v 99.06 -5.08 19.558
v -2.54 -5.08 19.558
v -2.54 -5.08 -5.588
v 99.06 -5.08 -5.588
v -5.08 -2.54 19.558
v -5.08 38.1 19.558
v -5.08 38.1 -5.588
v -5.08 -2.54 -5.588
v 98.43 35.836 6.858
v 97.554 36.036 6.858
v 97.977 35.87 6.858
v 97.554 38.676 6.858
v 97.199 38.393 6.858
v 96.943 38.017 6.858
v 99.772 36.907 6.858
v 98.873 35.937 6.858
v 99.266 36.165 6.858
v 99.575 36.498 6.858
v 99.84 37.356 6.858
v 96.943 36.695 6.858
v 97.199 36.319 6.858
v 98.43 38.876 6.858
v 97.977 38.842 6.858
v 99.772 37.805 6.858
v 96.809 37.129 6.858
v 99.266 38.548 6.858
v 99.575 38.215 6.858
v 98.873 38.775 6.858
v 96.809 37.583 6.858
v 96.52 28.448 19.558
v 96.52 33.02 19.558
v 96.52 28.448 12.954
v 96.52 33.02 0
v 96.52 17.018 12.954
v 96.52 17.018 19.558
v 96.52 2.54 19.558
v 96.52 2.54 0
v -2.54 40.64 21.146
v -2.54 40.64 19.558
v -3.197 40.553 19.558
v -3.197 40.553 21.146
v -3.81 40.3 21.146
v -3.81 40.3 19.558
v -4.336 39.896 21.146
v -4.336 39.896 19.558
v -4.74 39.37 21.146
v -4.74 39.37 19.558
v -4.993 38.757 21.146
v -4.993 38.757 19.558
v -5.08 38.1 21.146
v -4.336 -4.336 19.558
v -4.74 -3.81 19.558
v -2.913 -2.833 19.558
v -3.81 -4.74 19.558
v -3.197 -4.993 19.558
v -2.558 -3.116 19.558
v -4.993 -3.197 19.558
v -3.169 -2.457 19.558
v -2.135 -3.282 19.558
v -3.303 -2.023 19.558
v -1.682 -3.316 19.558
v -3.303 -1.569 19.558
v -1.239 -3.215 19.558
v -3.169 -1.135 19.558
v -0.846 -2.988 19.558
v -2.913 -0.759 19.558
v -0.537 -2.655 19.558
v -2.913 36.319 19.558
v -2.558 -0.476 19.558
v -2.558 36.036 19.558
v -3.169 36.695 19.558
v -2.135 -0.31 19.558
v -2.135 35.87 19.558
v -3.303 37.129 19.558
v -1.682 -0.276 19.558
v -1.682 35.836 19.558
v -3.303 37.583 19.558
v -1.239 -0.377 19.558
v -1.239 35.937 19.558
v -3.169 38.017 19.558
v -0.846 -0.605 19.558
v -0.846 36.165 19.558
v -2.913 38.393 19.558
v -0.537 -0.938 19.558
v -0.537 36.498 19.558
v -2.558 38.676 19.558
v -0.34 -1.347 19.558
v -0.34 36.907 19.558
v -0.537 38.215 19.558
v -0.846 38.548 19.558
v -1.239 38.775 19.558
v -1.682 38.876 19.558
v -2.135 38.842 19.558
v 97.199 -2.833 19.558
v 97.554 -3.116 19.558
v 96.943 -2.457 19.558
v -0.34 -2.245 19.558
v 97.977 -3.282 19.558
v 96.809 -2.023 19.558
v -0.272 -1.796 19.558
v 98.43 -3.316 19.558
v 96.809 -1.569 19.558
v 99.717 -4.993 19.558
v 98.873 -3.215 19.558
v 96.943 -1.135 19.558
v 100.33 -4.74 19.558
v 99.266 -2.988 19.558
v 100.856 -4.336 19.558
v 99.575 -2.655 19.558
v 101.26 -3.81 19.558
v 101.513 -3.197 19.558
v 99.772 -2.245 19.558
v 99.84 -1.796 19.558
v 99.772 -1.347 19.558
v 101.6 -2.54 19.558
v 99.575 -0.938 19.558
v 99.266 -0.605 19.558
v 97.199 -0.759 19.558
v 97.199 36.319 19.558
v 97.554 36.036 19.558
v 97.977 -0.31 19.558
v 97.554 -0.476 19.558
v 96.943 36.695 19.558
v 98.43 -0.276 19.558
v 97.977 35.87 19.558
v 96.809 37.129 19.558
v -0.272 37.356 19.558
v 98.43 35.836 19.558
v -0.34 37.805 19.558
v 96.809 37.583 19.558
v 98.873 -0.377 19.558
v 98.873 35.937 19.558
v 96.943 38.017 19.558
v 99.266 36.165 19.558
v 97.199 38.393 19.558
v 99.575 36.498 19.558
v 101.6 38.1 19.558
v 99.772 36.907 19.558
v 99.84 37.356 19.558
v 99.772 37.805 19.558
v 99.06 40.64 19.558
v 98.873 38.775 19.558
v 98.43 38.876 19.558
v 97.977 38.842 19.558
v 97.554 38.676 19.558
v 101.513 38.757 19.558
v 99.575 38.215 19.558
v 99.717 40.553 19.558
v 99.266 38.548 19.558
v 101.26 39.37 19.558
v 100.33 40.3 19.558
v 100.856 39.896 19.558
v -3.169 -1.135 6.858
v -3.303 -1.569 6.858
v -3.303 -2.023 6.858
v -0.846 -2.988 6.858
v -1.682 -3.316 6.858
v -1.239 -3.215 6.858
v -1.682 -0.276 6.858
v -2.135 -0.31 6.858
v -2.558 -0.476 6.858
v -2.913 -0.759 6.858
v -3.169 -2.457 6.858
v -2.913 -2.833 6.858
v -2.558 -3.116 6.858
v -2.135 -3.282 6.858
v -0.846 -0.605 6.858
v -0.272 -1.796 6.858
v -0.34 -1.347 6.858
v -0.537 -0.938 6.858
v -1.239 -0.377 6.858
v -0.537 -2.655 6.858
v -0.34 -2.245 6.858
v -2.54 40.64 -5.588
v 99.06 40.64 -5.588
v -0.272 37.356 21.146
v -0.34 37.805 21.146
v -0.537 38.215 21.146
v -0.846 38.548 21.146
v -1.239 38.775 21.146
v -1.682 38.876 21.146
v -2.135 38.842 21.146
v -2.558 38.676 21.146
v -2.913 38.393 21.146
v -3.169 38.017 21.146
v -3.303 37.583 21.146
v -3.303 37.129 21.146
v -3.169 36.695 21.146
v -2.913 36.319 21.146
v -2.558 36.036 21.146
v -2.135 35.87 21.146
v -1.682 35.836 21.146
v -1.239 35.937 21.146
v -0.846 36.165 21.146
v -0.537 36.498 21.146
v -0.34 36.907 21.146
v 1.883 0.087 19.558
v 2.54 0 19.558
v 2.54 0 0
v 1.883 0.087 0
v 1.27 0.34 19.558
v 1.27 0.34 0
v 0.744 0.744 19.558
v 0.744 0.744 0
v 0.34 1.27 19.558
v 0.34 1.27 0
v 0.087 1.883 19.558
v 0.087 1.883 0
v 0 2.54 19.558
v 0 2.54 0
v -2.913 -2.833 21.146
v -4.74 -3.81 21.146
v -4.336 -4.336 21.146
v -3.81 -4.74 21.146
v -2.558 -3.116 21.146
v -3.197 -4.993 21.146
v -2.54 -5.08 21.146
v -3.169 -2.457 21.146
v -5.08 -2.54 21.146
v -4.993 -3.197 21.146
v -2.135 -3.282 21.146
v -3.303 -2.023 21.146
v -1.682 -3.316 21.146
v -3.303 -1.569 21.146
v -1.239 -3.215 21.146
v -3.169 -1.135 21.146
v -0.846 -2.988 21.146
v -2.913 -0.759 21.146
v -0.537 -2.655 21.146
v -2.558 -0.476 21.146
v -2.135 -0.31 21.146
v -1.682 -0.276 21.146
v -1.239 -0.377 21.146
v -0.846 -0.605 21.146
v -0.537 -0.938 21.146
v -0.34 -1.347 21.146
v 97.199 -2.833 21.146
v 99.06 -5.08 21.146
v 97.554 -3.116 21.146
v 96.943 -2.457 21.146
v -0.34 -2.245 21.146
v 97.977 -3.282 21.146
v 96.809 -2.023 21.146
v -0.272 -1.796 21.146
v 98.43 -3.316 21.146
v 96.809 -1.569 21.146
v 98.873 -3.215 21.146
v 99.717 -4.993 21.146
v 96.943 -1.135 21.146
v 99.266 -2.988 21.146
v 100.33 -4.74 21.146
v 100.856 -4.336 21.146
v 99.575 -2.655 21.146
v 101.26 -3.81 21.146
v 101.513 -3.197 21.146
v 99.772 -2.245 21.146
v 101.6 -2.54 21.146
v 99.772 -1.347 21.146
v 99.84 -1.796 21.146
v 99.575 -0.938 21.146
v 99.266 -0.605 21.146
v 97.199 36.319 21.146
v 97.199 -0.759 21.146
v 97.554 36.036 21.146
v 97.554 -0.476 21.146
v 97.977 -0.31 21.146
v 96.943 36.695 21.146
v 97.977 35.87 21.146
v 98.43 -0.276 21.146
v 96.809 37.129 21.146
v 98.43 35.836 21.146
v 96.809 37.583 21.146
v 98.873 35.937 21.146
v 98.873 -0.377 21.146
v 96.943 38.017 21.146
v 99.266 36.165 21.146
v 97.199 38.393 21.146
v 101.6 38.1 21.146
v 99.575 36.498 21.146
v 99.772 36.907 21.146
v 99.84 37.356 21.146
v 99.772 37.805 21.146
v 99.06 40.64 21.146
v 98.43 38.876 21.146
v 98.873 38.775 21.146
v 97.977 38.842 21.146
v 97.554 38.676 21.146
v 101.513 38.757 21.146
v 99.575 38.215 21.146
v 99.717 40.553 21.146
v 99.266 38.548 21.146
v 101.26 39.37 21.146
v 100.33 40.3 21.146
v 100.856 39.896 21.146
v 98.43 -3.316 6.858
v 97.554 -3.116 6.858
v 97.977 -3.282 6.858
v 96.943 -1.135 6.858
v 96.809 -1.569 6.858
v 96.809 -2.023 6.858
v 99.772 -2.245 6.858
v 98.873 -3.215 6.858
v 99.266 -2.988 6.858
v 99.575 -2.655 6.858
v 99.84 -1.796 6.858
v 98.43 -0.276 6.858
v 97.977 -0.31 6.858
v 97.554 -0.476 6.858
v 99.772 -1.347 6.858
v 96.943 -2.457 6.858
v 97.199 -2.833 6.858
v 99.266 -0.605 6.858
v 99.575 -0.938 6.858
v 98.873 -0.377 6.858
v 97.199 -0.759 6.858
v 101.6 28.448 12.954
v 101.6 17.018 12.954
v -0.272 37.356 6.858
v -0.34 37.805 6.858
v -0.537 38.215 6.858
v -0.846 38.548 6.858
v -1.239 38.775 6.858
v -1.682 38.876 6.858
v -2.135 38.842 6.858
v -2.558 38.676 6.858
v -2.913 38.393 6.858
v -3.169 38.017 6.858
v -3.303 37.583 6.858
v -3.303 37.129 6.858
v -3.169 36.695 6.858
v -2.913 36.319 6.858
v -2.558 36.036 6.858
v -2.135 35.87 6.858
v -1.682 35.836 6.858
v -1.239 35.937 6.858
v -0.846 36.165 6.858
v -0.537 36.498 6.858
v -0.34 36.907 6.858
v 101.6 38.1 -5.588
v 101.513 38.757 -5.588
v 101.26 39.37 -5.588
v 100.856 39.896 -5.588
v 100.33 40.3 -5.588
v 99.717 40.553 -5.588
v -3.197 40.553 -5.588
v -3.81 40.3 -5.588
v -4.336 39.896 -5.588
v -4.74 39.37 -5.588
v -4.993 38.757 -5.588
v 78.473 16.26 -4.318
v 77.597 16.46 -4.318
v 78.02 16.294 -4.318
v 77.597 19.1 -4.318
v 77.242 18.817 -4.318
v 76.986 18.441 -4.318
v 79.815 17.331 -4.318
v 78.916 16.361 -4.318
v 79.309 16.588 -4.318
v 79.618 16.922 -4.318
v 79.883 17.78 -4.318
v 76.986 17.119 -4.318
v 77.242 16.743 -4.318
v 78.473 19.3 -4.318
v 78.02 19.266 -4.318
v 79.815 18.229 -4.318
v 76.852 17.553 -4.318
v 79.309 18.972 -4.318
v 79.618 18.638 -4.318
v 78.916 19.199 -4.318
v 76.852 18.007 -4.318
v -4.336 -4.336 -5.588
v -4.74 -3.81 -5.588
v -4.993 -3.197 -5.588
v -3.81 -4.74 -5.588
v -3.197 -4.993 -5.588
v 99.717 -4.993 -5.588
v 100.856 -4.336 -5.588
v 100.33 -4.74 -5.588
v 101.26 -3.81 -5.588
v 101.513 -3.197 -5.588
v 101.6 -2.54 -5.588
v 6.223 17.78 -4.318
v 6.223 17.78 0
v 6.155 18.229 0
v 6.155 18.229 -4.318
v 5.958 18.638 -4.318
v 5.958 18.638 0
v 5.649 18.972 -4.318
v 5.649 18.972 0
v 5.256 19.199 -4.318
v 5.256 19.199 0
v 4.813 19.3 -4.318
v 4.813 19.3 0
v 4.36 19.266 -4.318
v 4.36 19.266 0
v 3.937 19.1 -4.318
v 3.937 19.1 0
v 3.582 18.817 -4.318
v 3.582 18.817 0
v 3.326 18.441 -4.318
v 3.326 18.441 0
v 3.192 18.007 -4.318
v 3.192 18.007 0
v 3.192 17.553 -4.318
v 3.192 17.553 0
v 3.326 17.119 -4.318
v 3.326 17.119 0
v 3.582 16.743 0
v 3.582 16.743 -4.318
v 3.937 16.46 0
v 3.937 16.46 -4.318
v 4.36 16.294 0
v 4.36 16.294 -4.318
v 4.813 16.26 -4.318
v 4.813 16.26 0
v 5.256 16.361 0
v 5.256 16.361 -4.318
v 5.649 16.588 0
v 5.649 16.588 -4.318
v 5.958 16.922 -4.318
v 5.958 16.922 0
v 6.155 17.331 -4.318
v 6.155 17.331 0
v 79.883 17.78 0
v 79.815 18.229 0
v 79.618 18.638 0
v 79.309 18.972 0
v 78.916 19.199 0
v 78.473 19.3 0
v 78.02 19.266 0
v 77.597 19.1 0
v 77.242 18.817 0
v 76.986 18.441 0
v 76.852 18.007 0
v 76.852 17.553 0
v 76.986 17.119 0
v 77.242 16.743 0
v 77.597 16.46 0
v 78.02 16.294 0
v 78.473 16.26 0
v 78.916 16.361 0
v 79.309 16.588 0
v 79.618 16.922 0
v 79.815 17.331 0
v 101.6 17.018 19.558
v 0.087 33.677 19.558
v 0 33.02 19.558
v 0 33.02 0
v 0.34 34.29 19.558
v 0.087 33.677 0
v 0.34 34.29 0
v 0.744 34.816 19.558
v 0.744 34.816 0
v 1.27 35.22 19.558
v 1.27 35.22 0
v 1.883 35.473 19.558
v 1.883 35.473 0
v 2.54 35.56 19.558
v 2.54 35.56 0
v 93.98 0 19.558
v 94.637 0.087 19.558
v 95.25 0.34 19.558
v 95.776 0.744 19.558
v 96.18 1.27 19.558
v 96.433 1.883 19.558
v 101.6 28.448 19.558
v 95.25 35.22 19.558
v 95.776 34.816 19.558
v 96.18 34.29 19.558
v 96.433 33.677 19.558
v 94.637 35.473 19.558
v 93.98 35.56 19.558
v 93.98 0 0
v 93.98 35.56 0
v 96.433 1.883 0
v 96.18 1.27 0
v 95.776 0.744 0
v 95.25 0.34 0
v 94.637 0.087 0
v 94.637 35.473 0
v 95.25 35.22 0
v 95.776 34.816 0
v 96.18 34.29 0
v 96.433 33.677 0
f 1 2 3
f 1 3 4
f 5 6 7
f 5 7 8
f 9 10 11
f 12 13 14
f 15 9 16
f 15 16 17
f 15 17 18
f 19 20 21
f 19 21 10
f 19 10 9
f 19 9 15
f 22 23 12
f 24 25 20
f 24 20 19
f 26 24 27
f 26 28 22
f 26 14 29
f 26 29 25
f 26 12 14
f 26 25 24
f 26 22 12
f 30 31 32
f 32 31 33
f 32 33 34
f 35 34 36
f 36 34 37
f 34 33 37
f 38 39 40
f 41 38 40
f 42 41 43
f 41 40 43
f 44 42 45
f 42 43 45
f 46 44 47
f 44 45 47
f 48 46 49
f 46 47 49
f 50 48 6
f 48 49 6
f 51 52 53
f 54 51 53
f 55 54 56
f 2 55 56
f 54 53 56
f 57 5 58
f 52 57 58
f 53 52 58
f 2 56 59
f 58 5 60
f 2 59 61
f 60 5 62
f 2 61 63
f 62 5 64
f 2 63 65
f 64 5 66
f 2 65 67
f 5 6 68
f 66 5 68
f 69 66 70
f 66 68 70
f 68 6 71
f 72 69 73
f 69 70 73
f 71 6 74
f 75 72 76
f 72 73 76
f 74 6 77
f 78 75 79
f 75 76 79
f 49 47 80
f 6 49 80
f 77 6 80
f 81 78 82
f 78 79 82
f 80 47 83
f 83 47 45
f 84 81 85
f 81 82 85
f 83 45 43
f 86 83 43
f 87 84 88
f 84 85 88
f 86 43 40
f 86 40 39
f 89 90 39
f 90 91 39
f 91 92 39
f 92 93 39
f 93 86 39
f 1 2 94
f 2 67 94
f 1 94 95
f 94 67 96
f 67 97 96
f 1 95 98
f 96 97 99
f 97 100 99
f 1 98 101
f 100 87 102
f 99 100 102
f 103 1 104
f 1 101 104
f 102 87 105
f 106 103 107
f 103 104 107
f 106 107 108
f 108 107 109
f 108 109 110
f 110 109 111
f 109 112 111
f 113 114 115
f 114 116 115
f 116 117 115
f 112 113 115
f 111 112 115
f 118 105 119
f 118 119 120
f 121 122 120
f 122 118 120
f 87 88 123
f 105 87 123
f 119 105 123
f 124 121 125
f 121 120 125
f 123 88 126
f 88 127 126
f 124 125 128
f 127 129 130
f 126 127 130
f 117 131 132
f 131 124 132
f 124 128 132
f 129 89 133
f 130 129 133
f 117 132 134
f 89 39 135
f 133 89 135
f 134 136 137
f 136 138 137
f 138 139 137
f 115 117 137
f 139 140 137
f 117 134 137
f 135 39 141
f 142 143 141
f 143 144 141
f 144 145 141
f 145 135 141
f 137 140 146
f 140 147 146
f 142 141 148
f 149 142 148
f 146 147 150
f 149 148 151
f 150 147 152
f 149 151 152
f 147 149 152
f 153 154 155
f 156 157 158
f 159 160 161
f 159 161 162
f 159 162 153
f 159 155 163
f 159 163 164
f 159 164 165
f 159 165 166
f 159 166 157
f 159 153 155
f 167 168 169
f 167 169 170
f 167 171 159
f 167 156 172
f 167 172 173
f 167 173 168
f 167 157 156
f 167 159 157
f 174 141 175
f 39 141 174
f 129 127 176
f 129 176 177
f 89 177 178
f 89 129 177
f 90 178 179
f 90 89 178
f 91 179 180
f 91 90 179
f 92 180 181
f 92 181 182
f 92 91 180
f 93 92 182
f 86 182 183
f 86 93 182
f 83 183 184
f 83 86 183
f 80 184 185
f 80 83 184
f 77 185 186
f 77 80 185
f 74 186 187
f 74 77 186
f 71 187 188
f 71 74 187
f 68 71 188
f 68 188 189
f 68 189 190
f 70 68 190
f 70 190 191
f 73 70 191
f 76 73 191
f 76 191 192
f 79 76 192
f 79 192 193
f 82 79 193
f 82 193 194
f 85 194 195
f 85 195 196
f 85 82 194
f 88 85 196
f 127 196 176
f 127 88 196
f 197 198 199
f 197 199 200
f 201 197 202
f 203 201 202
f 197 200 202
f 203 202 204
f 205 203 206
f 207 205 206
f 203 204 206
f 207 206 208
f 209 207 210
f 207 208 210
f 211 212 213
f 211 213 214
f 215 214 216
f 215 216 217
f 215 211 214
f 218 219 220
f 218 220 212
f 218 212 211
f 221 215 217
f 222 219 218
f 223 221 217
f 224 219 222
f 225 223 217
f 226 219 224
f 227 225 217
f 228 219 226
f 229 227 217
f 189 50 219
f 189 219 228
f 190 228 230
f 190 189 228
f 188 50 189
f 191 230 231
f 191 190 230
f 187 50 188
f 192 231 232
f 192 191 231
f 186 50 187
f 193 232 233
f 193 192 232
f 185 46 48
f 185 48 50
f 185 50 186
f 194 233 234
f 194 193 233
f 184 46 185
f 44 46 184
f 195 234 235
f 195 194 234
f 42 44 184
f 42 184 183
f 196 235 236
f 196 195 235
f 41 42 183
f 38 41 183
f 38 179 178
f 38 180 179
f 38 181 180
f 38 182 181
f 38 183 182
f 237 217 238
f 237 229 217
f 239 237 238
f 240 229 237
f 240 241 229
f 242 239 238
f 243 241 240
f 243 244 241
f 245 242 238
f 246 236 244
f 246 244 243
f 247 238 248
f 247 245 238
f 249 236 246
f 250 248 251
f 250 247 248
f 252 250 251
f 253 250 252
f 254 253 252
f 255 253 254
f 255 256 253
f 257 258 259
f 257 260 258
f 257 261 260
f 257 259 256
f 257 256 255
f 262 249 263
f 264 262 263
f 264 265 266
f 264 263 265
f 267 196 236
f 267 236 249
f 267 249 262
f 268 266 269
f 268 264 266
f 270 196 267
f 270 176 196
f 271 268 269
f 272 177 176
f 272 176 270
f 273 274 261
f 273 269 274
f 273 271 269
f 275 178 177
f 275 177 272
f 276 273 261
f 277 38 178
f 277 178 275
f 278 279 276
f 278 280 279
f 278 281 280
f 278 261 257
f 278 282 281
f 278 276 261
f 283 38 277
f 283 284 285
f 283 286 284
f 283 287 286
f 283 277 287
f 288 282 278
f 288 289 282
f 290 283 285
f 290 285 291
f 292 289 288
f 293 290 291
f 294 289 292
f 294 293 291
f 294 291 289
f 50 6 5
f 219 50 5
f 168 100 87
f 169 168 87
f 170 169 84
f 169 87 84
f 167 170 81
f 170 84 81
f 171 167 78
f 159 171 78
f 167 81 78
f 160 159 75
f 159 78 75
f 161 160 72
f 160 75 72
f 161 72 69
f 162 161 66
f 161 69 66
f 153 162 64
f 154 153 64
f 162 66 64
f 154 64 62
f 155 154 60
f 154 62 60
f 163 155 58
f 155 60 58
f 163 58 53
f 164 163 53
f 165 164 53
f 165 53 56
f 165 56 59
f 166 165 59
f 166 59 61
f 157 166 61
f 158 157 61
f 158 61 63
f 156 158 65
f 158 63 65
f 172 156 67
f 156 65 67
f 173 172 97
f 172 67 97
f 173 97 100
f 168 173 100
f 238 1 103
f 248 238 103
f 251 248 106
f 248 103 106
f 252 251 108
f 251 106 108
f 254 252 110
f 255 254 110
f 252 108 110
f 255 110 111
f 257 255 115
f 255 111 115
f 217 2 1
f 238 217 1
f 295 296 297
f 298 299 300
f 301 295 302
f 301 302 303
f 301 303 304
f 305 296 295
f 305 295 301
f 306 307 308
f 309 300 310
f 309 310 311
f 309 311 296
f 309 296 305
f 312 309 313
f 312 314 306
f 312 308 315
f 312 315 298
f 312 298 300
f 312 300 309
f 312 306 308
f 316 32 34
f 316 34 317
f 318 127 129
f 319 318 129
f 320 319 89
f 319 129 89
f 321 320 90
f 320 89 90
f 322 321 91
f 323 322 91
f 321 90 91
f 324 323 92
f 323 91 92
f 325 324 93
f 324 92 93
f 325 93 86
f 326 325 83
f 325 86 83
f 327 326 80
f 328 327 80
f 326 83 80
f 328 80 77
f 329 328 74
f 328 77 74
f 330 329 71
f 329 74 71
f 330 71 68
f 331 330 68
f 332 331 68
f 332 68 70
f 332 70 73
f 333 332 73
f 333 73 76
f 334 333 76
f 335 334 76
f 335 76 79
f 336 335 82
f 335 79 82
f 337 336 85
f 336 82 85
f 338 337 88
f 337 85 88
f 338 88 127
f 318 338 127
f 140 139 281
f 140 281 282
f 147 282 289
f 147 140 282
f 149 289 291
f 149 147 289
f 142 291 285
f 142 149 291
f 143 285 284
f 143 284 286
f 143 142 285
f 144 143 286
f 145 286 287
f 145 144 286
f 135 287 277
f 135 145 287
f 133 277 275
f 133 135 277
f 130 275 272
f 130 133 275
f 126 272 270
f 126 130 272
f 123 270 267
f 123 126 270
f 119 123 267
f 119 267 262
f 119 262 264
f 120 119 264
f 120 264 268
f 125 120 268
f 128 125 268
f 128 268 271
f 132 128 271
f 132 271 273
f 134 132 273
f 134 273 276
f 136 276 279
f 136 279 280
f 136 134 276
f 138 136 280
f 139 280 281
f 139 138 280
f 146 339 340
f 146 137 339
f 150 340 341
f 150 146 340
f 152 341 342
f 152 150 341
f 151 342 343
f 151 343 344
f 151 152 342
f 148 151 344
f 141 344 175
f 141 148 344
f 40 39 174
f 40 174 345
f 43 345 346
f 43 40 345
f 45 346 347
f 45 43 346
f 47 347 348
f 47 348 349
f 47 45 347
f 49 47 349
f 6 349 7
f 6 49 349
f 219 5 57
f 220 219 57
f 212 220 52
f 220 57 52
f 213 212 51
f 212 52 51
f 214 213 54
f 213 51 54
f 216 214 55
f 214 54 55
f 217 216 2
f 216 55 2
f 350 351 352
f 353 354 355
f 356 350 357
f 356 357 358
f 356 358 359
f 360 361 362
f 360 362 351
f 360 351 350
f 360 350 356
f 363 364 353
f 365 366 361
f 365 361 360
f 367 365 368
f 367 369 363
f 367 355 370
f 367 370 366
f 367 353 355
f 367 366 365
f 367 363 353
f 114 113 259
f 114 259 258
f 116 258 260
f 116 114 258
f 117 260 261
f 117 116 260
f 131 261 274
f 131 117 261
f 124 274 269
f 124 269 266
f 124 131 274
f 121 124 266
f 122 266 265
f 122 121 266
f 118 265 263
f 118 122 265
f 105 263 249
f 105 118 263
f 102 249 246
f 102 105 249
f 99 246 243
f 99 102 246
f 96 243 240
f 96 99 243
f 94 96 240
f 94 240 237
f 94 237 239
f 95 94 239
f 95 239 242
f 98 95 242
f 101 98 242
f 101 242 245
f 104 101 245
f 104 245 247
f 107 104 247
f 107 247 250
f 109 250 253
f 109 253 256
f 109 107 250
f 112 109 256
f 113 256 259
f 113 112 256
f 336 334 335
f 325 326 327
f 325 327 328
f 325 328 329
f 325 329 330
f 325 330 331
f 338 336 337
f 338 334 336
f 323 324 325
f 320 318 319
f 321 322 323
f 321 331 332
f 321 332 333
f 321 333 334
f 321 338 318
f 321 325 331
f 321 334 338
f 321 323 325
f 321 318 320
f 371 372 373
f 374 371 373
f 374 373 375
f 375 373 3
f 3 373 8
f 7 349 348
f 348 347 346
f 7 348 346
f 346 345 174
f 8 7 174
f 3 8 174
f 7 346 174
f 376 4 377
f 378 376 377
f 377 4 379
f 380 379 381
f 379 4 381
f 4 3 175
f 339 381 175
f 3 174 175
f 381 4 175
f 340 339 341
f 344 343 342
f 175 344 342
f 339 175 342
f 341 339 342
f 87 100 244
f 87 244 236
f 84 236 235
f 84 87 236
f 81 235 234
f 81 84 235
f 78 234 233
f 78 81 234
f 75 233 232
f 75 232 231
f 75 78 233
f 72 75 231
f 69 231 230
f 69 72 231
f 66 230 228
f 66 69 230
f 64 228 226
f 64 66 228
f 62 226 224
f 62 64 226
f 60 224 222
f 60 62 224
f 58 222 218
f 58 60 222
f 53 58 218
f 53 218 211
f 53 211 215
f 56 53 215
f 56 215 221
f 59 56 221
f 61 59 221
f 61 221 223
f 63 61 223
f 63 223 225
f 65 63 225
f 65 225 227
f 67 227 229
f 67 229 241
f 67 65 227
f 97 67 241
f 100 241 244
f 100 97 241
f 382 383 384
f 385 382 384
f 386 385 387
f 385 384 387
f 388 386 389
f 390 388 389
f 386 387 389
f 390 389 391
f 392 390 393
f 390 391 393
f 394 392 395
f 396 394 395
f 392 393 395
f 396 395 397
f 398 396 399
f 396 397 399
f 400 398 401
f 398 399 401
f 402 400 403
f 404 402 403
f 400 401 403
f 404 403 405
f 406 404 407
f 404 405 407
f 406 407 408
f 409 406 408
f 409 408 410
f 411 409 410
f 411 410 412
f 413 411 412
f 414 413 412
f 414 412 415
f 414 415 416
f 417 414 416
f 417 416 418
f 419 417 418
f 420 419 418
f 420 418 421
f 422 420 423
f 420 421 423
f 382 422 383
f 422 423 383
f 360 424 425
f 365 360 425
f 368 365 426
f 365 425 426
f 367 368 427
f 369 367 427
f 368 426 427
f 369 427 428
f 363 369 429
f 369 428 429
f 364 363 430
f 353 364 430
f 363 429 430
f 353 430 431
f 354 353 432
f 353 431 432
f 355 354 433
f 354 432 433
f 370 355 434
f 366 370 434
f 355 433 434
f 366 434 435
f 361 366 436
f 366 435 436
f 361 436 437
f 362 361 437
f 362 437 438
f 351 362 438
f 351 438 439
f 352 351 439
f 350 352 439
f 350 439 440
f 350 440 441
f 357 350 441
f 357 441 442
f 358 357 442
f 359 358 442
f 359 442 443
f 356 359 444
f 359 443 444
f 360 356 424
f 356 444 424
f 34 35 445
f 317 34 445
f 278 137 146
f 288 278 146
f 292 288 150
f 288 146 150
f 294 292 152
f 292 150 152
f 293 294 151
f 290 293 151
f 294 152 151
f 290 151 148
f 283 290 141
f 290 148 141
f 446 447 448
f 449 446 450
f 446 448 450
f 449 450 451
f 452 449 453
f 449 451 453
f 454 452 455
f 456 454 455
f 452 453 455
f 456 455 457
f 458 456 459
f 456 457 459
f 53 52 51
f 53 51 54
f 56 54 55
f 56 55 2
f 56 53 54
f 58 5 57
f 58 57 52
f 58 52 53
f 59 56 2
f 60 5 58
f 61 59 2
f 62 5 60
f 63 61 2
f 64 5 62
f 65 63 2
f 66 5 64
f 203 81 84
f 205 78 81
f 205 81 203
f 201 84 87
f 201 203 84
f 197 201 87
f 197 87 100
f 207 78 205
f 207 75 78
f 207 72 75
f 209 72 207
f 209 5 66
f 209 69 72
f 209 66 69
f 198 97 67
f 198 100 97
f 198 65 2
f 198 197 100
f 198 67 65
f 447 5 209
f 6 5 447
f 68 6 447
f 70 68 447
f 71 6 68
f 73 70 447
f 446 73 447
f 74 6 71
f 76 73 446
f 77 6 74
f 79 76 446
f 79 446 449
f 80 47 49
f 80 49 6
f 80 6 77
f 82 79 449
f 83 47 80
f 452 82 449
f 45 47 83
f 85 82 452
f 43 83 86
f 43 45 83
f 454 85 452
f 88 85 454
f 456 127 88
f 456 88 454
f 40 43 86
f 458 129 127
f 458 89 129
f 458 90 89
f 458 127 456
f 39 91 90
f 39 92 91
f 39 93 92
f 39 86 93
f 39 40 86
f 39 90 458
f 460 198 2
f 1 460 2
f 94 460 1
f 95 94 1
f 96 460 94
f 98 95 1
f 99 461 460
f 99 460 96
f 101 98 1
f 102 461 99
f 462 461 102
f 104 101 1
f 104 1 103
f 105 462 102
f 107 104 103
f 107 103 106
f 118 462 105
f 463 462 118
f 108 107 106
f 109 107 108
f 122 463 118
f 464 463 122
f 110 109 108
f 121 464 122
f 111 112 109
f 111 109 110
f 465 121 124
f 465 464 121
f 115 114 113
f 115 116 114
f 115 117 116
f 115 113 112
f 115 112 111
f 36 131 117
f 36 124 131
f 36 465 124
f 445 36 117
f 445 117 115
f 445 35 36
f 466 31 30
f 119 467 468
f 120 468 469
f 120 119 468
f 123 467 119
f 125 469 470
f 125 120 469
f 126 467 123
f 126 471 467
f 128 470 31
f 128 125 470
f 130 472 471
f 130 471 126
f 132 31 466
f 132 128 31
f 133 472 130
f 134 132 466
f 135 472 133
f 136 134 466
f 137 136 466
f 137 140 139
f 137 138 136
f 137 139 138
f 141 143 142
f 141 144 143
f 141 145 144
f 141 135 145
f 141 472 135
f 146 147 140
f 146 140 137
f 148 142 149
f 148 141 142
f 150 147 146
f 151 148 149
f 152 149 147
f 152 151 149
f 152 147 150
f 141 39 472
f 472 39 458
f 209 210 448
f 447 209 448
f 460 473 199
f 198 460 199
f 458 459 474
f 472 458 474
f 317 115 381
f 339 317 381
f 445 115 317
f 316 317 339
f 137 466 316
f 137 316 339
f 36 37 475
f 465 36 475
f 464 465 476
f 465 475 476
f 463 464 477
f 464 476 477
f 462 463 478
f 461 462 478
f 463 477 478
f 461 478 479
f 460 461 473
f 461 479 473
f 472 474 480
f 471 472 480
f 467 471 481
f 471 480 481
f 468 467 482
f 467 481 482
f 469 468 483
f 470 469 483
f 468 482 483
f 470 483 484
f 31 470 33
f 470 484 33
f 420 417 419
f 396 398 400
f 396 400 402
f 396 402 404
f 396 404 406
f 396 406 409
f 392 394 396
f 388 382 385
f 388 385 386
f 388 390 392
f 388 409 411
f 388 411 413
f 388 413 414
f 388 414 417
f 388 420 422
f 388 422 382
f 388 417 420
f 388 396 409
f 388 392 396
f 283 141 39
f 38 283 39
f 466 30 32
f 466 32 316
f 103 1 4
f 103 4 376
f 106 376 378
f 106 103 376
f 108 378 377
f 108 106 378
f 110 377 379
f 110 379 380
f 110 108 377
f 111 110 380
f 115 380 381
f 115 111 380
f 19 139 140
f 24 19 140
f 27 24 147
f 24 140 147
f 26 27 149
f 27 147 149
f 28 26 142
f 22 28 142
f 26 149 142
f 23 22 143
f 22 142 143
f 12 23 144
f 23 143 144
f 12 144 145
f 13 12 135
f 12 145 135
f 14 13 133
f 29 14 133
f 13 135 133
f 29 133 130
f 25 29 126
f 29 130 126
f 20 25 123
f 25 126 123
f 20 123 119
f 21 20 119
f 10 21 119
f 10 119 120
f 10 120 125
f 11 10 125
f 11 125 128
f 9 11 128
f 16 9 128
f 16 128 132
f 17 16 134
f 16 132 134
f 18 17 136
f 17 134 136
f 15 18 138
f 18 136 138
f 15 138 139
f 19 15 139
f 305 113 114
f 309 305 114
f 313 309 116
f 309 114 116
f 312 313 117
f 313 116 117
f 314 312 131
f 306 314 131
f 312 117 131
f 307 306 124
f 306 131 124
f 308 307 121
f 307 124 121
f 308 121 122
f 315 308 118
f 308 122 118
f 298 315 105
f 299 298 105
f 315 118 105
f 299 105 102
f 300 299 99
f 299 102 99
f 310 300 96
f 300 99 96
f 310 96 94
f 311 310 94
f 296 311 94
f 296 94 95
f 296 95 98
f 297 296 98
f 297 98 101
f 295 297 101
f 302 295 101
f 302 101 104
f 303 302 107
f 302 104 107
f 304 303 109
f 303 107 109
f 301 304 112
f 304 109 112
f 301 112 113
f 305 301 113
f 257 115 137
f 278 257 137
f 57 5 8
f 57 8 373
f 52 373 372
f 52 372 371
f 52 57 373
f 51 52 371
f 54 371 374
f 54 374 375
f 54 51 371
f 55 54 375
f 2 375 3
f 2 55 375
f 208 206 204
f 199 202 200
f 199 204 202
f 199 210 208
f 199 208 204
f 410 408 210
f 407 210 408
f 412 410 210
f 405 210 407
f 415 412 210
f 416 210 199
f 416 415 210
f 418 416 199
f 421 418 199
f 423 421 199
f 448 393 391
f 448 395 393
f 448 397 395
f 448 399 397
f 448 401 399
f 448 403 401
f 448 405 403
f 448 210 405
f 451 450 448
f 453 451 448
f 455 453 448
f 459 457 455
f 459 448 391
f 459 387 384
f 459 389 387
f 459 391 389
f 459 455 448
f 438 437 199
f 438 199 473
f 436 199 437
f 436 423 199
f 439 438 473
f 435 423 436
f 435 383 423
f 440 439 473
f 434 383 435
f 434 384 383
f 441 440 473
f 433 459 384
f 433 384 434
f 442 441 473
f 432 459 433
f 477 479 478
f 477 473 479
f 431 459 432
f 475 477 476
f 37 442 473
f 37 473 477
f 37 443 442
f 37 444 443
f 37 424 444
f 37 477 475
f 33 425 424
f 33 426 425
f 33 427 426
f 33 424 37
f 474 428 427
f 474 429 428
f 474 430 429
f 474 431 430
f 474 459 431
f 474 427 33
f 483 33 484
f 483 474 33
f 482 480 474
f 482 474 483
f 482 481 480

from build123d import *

# Parameters (mm, degrees)
F1_DEPTH = 19.558
F0_R     = 1.524
F2_DEPTH = 5.588
F3_R     = 1.524
F4_DEPTH = 12.7
F5_W     = 5.08
F5_H     = 11.43
F6_DEPTH = 6.604
F7_DEPTH = 4.318
F8_R     = 1.524
F9_DEPTH = 1.5875


# Not quite as in the source:
# - a length typed as a fraction of an inch, garbled in the dataset ("3 / 203.2 mm" for 3/8 in), is restored


with BuildPart() as f1:
    # F0 (on Top) → F1 (new body)
    with BuildSketch(Plane.XY):
        with BuildLine():
            Line((99.06, 40.64), (-2.54, 40.64))
            ThreePointArc((-2.54, 40.64), (-4.3360512242, 39.8960512242), (-5.08, 38.1))
            Line((-5.08, 38.1), (-5.08, -2.54))
            ThreePointArc((-5.08, -2.54), (-4.3360512242, -4.3360512242), (-2.54, -5.08))
            Line((-2.54, -5.08), (99.06, -5.08))
            ThreePointArc((99.06, -5.08), (100.8560512242, -4.3360512242), (101.6, -2.54))
            Line((101.6, -2.54), (101.6, 38.1))
            ThreePointArc((101.6, 38.1), (100.8560512242, 39.8960512242), (99.06, 40.64))
        make_face()
        with BuildLine():
            Line((93.98, 0), (2.54, 0))
            ThreePointArc((2.54, 0), (0.7439487758, 0.7439487758), (0, 2.54))
            Line((0, 2.54), (0, 33.02))
            ThreePointArc((0, 33.02), (0.7439487758, 34.8160512242), (2.54, 35.56))
            Line((2.54, 35.56), (93.98, 35.56))
            ThreePointArc((93.98, 35.56), (95.7760512242, 34.8160512242), (96.52, 33.02))
            Line((96.52, 33.02), (96.52, 2.54))
            ThreePointArc((96.52, 2.54), (95.7760512242, 0.7439487758), (93.98, 0))
        make_face(mode=Mode.SUBTRACT)
    extrude(amount=F1_DEPTH)

    # F0 (on Top) → F2 (join)
    with BuildSketch(Plane.XY):
        with BuildLine():
            Line((99.06, 40.64), (-2.54, 40.64))
            ThreePointArc((-2.54, 40.64), (-4.3360512242, 39.8960512242), (-5.08, 38.1))
            Line((-5.08, 38.1), (-5.08, -2.54))
            ThreePointArc((-5.08, -2.54), (-4.3360512242, -4.3360512242), (-2.54, -5.08))
            Line((-2.54, -5.08), (99.06, -5.08))
            ThreePointArc((99.06, -5.08), (100.8560512242, -4.3360512242), (101.6, -2.54))
            Line((101.6, -2.54), (101.6, 38.1))
            ThreePointArc((101.6, 38.1), (100.8560512242, 39.8960512242), (99.06, 40.64))
        make_face()
        with BuildLine():
            Line((93.98, 0), (2.54, 0))
            ThreePointArc((2.54, 0), (0.7439487758, 0.7439487758), (0, 2.54))
            Line((0, 2.54), (0, 33.02))
            ThreePointArc((0, 33.02), (0.7439487758, 34.8160512242), (2.54, 35.56))
            Line((2.54, 35.56), (93.98, 35.56))
            ThreePointArc((93.98, 35.56), (95.7760512242, 34.8160512242), (96.52, 33.02))
            Line((96.52, 33.02), (96.52, 2.54))
            ThreePointArc((96.52, 2.54), (95.7760512242, 0.7439487758), (93.98, 0))
        make_face(mode=Mode.SUBTRACT)
        with BuildLine():
            ThreePointArc((0, 2.54), (0.7439487758, 0.7439487758), (2.54, 0))
            Line((2.54, 0), (93.98, 0))
            ThreePointArc((93.98, 0), (95.7760512242, 0.7439487758), (96.52, 2.54))
            Line((96.52, 2.54), (96.52, 33.02))
            ThreePointArc((96.52, 33.02), (95.7760512242, 34.8160512242), (93.98, 35.56))
            Line((93.98, 35.56), (2.54, 35.56))
            ThreePointArc((2.54, 35.56), (0.7439487758, 34.8160512242), (0, 33.02))
            Line((0, 33.02), (0, 2.54))
        make_face()
        with Locations((4.699, 17.78)):
            Circle(F0_R, mode=Mode.SUBTRACT)
        with Locations((78.359, 17.78)):
            Circle(F0_R, mode=Mode.SUBTRACT)
        with Locations((78.359, 17.78)):
            Circle(F0_R)
        with Locations((4.699, 17.78)):
            Circle(F0_R)
    extrude(amount=-F2_DEPTH)

    # F3 (on face) → F4 (cut)
    with BuildSketch(Plane.XY.offset(19.558)):
        with Locations((-1.7960512242, -1.7960512242)):
            Circle(F3_R)
        with Locations((-1.7960512242, 37.3560512242)):
            Circle(F3_R)
        with Locations((98.3160512242, 37.3560512242)):
            Circle(F3_R)
        with Locations((98.3160512242, -1.7960512242)):
            Circle(F3_R)
    extrude(amount=-F4_DEPTH, mode=Mode.SUBTRACT)

    # F5 (on face) → F6 (cut)
    with BuildSketch(Plane.XY.offset(19.558)):
        with Locations((99.06, 22.733)):
            Rectangle(F5_W, F5_H)
    extrude(amount=-F6_DEPTH, mode=Mode.SUBTRACT)

    # F0 (on Top) → F7 (cut)
    with BuildSketch(Plane.XY):
        with Locations((4.699, 17.78)):
            Circle(F0_R)
        with Locations((78.359, 17.78)):
            Circle(F0_R)
    extrude(amount=-F7_DEPTH, mode=Mode.SUBTRACT)


with BuildPart() as f9:
    # F8 (on face) → F9 (new body)
    with BuildSketch(Plane.XY.offset(19.558)):
        with BuildLine():
            Line((99.06, 40.64), (-2.54, 40.64))
            ThreePointArc((-2.54, 40.64), (-4.3360512242, 39.8960512242), (-5.08, 38.1))
            Line((-5.08, 38.1), (-5.08, -2.54))
            ThreePointArc((-5.08, -2.54), (-4.3360512242, -4.3360512242), (-2.54, -5.08))
            Line((-2.54, -5.08), (99.06, -5.08))
            ThreePointArc((99.06, -5.08), (100.8560512242, -4.3360512242), (101.6, -2.54))
            Line((101.6, -2.54), (101.6, 38.1))
            ThreePointArc((101.6, 38.1), (100.8560512242, 39.8960512242), (99.06, 40.64))
        make_face()
        with Locations((-1.7960512242, -1.7960512242)):
            Circle(F8_R, mode=Mode.SUBTRACT)
        with Locations((98.3160512242, -1.7960512242)):
            Circle(F8_R, mode=Mode.SUBTRACT)
        with Locations((-1.7960512242, 37.3560512242)):
            Circle(F8_R, mode=Mode.SUBTRACT)
        with Locations((98.3160512242, 37.3560512242)):
            Circle(F8_R, mode=Mode.SUBTRACT)
    extrude(amount=F9_DEPTH)


solid = Compound([f1.part, f9.part])
